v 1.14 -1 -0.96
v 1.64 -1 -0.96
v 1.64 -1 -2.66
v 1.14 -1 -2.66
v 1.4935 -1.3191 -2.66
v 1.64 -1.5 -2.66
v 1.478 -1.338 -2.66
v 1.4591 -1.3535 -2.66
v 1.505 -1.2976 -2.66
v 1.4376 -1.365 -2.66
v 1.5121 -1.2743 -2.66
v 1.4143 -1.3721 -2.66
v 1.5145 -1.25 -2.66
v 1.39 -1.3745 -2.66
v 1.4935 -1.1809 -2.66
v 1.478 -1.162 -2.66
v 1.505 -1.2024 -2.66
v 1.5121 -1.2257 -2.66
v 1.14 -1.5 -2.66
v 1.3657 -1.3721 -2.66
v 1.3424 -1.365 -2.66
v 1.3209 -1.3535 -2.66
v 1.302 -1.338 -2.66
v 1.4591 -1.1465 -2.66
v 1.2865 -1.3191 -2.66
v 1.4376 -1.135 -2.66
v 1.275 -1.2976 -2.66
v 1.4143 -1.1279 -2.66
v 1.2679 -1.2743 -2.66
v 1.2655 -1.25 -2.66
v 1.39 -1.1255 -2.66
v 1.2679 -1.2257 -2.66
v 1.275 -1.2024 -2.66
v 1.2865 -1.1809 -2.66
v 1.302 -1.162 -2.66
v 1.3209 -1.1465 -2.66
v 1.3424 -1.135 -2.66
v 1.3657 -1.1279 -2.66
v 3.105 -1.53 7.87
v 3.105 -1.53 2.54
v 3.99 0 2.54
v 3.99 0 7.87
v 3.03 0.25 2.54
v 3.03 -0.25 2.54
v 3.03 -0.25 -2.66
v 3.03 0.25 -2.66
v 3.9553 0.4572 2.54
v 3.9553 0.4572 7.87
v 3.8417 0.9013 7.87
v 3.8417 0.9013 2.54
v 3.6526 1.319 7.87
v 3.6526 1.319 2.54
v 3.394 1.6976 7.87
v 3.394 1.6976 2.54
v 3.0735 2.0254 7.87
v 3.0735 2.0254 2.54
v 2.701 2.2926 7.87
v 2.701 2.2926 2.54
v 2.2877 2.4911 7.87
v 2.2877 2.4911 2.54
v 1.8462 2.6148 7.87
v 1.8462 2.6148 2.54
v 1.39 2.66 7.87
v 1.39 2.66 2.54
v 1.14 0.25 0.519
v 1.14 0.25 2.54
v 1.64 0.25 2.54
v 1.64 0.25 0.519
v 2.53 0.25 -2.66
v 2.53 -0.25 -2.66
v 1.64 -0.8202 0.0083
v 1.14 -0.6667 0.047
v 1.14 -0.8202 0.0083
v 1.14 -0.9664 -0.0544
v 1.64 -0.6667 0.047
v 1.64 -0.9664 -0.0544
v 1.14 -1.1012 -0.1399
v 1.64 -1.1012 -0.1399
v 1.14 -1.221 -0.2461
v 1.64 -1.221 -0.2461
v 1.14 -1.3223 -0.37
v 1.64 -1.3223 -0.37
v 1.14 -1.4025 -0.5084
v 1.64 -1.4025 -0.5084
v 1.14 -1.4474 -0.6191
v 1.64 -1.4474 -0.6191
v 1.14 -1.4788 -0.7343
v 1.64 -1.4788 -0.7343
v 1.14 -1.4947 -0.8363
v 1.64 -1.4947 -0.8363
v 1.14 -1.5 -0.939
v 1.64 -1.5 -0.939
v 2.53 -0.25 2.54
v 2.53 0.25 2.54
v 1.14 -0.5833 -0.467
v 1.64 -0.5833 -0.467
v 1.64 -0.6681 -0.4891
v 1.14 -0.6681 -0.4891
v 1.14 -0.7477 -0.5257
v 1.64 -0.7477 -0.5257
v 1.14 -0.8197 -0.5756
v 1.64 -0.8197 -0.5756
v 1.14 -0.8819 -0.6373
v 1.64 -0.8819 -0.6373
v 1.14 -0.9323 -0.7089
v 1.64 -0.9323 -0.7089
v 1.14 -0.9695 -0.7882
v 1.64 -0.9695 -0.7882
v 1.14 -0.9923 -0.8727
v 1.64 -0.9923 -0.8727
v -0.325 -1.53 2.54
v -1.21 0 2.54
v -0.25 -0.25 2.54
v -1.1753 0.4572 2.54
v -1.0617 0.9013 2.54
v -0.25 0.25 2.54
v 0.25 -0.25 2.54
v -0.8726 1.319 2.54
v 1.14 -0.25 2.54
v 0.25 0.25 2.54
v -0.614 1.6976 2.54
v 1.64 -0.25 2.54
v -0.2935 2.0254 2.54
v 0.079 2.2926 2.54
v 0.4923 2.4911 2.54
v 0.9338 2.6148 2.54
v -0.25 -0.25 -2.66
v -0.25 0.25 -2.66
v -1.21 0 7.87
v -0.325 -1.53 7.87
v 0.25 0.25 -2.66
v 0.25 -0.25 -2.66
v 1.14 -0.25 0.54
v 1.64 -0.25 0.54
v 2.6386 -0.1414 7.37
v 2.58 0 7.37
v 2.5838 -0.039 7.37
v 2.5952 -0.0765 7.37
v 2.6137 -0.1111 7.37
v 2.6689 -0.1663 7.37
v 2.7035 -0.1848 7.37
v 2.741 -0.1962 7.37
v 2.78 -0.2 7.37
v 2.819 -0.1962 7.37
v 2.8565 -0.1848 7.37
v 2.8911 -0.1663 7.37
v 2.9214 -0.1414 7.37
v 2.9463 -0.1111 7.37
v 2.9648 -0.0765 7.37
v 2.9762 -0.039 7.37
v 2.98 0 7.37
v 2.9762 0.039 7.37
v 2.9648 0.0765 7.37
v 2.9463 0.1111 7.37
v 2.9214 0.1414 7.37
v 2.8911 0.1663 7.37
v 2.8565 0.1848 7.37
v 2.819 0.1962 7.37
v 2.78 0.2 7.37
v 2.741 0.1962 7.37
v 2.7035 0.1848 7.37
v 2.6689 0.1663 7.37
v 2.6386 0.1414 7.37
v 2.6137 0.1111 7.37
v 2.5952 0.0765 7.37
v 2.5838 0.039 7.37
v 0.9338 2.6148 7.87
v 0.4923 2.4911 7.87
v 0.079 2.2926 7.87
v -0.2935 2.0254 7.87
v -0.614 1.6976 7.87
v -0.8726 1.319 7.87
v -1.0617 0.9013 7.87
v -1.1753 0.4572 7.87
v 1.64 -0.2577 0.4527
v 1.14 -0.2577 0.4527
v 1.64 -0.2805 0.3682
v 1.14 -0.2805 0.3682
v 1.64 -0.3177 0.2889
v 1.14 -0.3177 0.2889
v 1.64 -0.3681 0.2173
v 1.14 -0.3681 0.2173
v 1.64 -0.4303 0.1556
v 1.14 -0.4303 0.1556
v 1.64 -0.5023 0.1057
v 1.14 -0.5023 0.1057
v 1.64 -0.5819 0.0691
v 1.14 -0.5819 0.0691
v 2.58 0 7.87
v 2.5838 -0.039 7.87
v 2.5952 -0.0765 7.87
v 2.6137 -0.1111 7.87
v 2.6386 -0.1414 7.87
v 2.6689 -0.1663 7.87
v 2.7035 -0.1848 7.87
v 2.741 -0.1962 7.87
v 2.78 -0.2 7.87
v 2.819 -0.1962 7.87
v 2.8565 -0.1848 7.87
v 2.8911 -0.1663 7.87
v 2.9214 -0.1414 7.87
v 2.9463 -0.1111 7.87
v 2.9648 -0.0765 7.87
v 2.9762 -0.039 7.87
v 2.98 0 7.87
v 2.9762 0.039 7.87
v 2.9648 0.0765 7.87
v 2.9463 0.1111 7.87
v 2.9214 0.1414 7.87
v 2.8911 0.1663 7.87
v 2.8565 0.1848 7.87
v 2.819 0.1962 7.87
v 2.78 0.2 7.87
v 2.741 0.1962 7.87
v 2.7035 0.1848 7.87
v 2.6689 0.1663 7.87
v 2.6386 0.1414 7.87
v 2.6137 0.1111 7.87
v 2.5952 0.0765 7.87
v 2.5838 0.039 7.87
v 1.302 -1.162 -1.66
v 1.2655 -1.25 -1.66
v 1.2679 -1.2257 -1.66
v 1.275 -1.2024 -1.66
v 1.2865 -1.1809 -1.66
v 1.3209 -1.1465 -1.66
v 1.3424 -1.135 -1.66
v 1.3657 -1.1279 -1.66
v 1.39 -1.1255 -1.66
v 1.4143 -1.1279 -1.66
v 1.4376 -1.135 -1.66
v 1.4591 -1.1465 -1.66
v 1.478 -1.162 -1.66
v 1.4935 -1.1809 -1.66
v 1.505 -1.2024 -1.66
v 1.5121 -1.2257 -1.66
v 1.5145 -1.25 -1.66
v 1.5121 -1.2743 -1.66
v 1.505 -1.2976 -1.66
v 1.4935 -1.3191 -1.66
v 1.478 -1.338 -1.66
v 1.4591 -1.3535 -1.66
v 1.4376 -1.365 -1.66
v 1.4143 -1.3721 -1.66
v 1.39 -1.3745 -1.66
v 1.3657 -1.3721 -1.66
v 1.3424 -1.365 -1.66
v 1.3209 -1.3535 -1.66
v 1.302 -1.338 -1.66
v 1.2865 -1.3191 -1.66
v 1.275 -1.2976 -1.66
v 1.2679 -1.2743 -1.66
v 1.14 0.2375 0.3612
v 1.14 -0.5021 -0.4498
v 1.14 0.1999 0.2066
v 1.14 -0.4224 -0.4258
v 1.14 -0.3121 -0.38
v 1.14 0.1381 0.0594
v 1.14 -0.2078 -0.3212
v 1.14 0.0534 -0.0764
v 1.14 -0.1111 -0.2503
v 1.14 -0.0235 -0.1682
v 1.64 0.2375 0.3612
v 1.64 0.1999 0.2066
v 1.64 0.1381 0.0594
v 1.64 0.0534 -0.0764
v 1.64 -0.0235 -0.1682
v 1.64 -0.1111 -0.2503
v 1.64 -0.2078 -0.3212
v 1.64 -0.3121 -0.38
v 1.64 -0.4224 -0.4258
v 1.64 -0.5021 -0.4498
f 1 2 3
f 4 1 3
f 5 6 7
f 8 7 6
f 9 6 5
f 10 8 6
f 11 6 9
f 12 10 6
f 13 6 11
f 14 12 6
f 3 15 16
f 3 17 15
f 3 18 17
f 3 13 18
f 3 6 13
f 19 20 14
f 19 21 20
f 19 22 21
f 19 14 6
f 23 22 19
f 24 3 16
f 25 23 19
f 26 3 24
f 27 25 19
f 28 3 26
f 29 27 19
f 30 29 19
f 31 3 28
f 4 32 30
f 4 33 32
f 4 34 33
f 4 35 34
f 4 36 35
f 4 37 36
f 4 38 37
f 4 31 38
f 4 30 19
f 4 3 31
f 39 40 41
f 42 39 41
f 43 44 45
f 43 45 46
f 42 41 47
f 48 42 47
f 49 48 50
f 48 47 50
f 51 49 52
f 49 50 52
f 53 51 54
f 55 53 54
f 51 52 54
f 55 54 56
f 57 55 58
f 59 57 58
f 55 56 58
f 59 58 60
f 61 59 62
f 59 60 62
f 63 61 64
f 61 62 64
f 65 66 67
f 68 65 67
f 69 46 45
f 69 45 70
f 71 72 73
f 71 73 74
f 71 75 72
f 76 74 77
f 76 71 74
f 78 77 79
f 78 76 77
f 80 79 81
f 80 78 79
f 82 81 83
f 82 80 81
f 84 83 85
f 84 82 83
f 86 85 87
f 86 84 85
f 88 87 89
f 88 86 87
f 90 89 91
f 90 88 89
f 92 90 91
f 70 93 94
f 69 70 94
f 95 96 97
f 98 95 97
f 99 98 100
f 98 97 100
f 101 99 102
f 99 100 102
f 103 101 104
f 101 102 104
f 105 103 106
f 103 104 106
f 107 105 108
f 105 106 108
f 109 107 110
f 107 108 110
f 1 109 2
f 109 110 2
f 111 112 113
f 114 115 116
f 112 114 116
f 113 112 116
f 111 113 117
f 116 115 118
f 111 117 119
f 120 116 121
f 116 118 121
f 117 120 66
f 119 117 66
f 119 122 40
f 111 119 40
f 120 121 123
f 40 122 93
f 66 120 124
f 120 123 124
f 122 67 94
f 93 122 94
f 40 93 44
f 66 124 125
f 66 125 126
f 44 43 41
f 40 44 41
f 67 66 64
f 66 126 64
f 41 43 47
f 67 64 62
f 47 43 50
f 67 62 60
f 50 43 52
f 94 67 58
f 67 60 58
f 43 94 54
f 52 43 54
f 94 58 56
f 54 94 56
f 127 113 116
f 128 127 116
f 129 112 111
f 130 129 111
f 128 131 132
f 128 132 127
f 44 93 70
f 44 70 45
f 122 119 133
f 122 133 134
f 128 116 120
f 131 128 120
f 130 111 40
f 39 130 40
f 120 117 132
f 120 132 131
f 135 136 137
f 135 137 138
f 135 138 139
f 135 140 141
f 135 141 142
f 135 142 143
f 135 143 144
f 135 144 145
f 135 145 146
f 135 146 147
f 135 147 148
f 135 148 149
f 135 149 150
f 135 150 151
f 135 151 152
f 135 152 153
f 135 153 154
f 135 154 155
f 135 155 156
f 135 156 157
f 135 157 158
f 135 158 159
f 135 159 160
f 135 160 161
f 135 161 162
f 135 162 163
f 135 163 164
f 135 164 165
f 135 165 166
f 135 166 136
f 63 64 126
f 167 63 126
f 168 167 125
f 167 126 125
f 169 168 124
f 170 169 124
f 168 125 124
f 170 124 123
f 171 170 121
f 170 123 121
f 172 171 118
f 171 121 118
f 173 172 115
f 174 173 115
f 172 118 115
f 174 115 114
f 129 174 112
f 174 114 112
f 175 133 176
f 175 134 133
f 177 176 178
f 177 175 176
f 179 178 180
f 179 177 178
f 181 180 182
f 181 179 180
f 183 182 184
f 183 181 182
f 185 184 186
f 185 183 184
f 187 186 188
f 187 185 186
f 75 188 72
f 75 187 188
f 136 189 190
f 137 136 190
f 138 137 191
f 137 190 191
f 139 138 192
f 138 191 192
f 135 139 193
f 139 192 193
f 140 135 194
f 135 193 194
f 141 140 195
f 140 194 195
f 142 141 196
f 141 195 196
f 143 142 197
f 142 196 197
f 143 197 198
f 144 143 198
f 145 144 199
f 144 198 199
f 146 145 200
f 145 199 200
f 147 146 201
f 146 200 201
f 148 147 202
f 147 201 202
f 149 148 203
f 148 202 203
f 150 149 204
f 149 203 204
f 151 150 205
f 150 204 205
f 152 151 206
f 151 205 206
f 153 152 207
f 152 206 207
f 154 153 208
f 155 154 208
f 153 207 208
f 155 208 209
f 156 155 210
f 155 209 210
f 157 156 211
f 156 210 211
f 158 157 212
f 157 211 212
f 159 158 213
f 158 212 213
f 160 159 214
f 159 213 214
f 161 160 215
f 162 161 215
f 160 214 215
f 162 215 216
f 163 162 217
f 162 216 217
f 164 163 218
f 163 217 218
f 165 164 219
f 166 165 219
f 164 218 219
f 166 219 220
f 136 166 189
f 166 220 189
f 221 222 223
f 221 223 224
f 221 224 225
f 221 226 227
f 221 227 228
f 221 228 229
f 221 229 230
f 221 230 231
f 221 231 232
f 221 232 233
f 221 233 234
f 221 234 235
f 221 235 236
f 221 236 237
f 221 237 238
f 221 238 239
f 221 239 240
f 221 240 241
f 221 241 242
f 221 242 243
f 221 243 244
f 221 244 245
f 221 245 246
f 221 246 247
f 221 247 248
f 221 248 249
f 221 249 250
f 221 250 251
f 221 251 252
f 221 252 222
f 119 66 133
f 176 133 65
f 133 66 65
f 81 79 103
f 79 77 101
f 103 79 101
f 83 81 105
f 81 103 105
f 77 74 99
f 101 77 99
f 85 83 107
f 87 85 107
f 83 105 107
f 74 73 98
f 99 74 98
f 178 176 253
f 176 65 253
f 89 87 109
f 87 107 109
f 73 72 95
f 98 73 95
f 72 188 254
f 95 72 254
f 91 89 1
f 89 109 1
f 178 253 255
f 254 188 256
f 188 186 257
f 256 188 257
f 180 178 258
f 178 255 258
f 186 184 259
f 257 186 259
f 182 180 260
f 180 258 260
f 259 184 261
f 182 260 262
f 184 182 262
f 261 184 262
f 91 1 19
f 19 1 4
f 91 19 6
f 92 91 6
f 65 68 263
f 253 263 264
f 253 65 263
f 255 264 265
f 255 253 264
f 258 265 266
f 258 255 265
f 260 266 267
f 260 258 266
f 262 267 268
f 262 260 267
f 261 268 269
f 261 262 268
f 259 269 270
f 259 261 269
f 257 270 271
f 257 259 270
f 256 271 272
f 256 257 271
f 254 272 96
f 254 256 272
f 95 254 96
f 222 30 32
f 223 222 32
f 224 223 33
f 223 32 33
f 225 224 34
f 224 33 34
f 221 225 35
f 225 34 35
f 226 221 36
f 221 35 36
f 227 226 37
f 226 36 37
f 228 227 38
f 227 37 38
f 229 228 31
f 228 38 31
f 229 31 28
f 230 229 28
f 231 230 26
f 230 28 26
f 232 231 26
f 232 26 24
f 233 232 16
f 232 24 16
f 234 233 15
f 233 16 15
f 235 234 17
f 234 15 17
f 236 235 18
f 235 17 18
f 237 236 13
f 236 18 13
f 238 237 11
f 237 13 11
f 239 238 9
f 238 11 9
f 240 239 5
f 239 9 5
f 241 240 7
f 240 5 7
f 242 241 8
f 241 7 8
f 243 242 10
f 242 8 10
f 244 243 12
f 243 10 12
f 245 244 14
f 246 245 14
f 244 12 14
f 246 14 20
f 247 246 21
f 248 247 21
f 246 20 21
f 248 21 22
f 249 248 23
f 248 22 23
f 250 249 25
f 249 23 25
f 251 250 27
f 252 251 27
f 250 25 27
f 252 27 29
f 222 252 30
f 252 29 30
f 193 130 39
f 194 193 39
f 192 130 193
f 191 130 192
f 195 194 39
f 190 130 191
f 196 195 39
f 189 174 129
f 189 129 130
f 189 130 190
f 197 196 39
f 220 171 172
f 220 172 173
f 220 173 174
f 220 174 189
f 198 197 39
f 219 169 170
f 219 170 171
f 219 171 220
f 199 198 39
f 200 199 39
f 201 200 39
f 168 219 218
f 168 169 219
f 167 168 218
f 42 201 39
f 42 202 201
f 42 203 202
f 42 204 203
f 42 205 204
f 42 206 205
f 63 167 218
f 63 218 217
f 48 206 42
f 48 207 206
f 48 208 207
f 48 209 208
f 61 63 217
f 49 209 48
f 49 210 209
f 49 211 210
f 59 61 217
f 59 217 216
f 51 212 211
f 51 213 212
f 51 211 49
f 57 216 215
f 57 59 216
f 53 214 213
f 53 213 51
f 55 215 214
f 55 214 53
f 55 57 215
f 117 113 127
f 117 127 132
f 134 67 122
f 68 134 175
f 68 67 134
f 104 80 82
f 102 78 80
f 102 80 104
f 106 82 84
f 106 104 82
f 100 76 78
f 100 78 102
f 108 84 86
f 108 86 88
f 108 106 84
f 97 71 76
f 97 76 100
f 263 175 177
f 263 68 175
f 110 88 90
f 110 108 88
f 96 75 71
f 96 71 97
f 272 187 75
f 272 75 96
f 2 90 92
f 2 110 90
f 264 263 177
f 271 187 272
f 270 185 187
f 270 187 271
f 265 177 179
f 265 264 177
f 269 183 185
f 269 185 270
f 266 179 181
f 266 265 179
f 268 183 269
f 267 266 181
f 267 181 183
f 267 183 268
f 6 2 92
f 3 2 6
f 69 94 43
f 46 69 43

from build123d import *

# Parameters (mm, degrees)
EXTRUDE_1_DEPTH     = 5.33
SKETCH_1_W          = 0.5
SKETCH_1_H          = 0.5
EXTRUDE_2_DEPTH     = 2.54
SKETCH_1_2_W        = 0.5
SKETCH_1_2_H        = 0.5
EXTRUDE_3_DEPTH     = 10.16
SKETCH_4_R          = 0.2
CUT_EXTRUDE_1_DEPTH = 0.5
SKETCH_5_W          = 0.5
SKETCH_5_H          = 10.2
EXTRUDE_4_DEPTH     = 1.25
CUT_EXTRUDE_2_DEPTH = 1
FILLET_1_R          = 0.5
FILLET_2_R          = 1
SKETCH_7_W          = 0.5
SKETCH_7_H          = 0.5
CUT_EXTRUDE_3_DEPTH = 7.5
SKETCH_8_R          = 0.124451118
CUT_EXTRUDE_4_DEPTH = 1


with BuildPart() as part:
    # Эскиз3 → Вытянуть1 (new body)
    with BuildSketch(Plane.XY.offset(2.54)):
        with BuildLine():
            Line((-0.325, -1.53), (3.105, -1.53))
            Line((3.105, -1.53), (3.99, 0))
            ThreePointArc((3.99, 0), (3.240904038, 1.868477631), (1.39, 2.66))
            ThreePointArc((1.39, 2.66), (-0.460904038, 1.868477631), (-1.21, 0))
            Line((-1.21, 0), (-0.325, -1.53))
        make_face()
    extrude(amount=EXTRUDE_1_DEPTH)

    # Эскиз1 → Вытянуть2 (add)
    with BuildSketch(Plane.XY):
        with Locations((1.39, 0)):
            Rectangle(SKETCH_1_W, SKETCH_1_H)
        Rectangle(SKETCH_1_W, SKETCH_1_H)
        with Locations((2.78, 0)):
            Rectangle(SKETCH_1_W, SKETCH_1_H)
    extrude(amount=EXTRUDE_2_DEPTH)

    # Эскиз1<2> → Вытянуть3 (add)
    with BuildSketch(Plane.XY):
        with Locations((1.39, 0)):
            Rectangle(SKETCH_1_2_W, SKETCH_1_2_H)
        Rectangle(SKETCH_1_2_W, SKETCH_1_2_H)
        with Locations((2.78, 0)):
            Rectangle(SKETCH_1_2_W, SKETCH_1_2_H)
    extrude(amount=-EXTRUDE_3_DEPTH)

    # Эскиз4 → Вырез-Вытянуть1 (cut)
    with BuildSketch(Plane.XY.offset(7.87)):
        with Locations((2.78, 0)):
            Circle(SKETCH_4_R)
    extrude(amount=-CUT_EXTRUDE_1_DEPTH, mode=Mode.SUBTRACT)

    # Эскиз5 → Вытянуть4 (add)
    with BuildSketch(Plane(origin=(0, -0.25, 0), x_dir=(1, 0, 0), z_dir=(0, 1, 0))):
        with Locations((1.39, 5.06)):
            Rectangle(SKETCH_5_W, SKETCH_5_H)
    extrude(amount=-EXTRUDE_4_DEPTH)

    # Эскиз6 → Вырез-Вытянуть2 (cut)
    with BuildSketch(Plane(origin=(1.64, 0, 0), x_dir=(0, 0, -1), z_dir=(1, 0, 0))):
        with BuildLine():
            Line((2.46, -1), (10.787068804, -1))
            Line((10.787068804, -1), (10.787068804, 0.83850211))
            Line((10.787068804, 0.83850211), (10.787068804, 2.125358058))
            Line((10.787068804, 2.125358058), (2.46, 2.125358058))
            Line((2.46, 2.125358058), (0.46, 2.125358058))
            Line((0.46, 2.125358058), (0.46, -0.5))
            ThreePointArc((0.46, -0.5), (0.606446609, -0.853553391), (0.96, -1))
            Line((0.96, -1), (2.46, -1))
        make_face()
    extrude(amount=-CUT_EXTRUDE_2_DEPTH, mode=Mode.SUBTRACT)

    # Скругление1
    fillet_1_edges = [part.edges().sort_by_distance(p)[0] for p in [
        (1.39, -0.25, 0.04),
    ]]
    fillet(fillet_1_edges, radius=FILLET_1_R)

    # Скругление2
    fillet_2_edges = [part.edges().sort_by_distance(p)[0] for p in [
        (1.39, -1.5, 0.04),
        (1.39, 0.25, -0.46),
    ]]
    fillet(fillet_2_edges, radius=FILLET_2_R)

    # Эскиз7 → Вырез-Вытянуть3 (cut)
    with BuildSketch(Plane(origin=(0, 0, -10.16), x_dir=(-1, 0, 0), z_dir=(0, 0, -1))):
        with Locations((-1.39, -1.25)):
            Rectangle(SKETCH_7_W, SKETCH_7_H)
        Rectangle(SKETCH_7_W, SKETCH_7_H)
        with Locations((-2.78, 0)):
            Rectangle(SKETCH_7_W, SKETCH_7_H)
    extrude(amount=-CUT_EXTRUDE_3_DEPTH, mode=Mode.SUBTRACT)

    # Эскиз8 → Вырез-Вытянуть4 (cut)
    with BuildSketch(Plane(origin=(0, 0, -2.66), x_dir=(-1, 0, 0), z_dir=(0, 0, -1))):
        with Locations((-1.39, -1.25)):
            Circle(SKETCH_8_R)
    extrude(amount=-CUT_EXTRUDE_4_DEPTH, mode=Mode.SUBTRACT)


solid = part.part
